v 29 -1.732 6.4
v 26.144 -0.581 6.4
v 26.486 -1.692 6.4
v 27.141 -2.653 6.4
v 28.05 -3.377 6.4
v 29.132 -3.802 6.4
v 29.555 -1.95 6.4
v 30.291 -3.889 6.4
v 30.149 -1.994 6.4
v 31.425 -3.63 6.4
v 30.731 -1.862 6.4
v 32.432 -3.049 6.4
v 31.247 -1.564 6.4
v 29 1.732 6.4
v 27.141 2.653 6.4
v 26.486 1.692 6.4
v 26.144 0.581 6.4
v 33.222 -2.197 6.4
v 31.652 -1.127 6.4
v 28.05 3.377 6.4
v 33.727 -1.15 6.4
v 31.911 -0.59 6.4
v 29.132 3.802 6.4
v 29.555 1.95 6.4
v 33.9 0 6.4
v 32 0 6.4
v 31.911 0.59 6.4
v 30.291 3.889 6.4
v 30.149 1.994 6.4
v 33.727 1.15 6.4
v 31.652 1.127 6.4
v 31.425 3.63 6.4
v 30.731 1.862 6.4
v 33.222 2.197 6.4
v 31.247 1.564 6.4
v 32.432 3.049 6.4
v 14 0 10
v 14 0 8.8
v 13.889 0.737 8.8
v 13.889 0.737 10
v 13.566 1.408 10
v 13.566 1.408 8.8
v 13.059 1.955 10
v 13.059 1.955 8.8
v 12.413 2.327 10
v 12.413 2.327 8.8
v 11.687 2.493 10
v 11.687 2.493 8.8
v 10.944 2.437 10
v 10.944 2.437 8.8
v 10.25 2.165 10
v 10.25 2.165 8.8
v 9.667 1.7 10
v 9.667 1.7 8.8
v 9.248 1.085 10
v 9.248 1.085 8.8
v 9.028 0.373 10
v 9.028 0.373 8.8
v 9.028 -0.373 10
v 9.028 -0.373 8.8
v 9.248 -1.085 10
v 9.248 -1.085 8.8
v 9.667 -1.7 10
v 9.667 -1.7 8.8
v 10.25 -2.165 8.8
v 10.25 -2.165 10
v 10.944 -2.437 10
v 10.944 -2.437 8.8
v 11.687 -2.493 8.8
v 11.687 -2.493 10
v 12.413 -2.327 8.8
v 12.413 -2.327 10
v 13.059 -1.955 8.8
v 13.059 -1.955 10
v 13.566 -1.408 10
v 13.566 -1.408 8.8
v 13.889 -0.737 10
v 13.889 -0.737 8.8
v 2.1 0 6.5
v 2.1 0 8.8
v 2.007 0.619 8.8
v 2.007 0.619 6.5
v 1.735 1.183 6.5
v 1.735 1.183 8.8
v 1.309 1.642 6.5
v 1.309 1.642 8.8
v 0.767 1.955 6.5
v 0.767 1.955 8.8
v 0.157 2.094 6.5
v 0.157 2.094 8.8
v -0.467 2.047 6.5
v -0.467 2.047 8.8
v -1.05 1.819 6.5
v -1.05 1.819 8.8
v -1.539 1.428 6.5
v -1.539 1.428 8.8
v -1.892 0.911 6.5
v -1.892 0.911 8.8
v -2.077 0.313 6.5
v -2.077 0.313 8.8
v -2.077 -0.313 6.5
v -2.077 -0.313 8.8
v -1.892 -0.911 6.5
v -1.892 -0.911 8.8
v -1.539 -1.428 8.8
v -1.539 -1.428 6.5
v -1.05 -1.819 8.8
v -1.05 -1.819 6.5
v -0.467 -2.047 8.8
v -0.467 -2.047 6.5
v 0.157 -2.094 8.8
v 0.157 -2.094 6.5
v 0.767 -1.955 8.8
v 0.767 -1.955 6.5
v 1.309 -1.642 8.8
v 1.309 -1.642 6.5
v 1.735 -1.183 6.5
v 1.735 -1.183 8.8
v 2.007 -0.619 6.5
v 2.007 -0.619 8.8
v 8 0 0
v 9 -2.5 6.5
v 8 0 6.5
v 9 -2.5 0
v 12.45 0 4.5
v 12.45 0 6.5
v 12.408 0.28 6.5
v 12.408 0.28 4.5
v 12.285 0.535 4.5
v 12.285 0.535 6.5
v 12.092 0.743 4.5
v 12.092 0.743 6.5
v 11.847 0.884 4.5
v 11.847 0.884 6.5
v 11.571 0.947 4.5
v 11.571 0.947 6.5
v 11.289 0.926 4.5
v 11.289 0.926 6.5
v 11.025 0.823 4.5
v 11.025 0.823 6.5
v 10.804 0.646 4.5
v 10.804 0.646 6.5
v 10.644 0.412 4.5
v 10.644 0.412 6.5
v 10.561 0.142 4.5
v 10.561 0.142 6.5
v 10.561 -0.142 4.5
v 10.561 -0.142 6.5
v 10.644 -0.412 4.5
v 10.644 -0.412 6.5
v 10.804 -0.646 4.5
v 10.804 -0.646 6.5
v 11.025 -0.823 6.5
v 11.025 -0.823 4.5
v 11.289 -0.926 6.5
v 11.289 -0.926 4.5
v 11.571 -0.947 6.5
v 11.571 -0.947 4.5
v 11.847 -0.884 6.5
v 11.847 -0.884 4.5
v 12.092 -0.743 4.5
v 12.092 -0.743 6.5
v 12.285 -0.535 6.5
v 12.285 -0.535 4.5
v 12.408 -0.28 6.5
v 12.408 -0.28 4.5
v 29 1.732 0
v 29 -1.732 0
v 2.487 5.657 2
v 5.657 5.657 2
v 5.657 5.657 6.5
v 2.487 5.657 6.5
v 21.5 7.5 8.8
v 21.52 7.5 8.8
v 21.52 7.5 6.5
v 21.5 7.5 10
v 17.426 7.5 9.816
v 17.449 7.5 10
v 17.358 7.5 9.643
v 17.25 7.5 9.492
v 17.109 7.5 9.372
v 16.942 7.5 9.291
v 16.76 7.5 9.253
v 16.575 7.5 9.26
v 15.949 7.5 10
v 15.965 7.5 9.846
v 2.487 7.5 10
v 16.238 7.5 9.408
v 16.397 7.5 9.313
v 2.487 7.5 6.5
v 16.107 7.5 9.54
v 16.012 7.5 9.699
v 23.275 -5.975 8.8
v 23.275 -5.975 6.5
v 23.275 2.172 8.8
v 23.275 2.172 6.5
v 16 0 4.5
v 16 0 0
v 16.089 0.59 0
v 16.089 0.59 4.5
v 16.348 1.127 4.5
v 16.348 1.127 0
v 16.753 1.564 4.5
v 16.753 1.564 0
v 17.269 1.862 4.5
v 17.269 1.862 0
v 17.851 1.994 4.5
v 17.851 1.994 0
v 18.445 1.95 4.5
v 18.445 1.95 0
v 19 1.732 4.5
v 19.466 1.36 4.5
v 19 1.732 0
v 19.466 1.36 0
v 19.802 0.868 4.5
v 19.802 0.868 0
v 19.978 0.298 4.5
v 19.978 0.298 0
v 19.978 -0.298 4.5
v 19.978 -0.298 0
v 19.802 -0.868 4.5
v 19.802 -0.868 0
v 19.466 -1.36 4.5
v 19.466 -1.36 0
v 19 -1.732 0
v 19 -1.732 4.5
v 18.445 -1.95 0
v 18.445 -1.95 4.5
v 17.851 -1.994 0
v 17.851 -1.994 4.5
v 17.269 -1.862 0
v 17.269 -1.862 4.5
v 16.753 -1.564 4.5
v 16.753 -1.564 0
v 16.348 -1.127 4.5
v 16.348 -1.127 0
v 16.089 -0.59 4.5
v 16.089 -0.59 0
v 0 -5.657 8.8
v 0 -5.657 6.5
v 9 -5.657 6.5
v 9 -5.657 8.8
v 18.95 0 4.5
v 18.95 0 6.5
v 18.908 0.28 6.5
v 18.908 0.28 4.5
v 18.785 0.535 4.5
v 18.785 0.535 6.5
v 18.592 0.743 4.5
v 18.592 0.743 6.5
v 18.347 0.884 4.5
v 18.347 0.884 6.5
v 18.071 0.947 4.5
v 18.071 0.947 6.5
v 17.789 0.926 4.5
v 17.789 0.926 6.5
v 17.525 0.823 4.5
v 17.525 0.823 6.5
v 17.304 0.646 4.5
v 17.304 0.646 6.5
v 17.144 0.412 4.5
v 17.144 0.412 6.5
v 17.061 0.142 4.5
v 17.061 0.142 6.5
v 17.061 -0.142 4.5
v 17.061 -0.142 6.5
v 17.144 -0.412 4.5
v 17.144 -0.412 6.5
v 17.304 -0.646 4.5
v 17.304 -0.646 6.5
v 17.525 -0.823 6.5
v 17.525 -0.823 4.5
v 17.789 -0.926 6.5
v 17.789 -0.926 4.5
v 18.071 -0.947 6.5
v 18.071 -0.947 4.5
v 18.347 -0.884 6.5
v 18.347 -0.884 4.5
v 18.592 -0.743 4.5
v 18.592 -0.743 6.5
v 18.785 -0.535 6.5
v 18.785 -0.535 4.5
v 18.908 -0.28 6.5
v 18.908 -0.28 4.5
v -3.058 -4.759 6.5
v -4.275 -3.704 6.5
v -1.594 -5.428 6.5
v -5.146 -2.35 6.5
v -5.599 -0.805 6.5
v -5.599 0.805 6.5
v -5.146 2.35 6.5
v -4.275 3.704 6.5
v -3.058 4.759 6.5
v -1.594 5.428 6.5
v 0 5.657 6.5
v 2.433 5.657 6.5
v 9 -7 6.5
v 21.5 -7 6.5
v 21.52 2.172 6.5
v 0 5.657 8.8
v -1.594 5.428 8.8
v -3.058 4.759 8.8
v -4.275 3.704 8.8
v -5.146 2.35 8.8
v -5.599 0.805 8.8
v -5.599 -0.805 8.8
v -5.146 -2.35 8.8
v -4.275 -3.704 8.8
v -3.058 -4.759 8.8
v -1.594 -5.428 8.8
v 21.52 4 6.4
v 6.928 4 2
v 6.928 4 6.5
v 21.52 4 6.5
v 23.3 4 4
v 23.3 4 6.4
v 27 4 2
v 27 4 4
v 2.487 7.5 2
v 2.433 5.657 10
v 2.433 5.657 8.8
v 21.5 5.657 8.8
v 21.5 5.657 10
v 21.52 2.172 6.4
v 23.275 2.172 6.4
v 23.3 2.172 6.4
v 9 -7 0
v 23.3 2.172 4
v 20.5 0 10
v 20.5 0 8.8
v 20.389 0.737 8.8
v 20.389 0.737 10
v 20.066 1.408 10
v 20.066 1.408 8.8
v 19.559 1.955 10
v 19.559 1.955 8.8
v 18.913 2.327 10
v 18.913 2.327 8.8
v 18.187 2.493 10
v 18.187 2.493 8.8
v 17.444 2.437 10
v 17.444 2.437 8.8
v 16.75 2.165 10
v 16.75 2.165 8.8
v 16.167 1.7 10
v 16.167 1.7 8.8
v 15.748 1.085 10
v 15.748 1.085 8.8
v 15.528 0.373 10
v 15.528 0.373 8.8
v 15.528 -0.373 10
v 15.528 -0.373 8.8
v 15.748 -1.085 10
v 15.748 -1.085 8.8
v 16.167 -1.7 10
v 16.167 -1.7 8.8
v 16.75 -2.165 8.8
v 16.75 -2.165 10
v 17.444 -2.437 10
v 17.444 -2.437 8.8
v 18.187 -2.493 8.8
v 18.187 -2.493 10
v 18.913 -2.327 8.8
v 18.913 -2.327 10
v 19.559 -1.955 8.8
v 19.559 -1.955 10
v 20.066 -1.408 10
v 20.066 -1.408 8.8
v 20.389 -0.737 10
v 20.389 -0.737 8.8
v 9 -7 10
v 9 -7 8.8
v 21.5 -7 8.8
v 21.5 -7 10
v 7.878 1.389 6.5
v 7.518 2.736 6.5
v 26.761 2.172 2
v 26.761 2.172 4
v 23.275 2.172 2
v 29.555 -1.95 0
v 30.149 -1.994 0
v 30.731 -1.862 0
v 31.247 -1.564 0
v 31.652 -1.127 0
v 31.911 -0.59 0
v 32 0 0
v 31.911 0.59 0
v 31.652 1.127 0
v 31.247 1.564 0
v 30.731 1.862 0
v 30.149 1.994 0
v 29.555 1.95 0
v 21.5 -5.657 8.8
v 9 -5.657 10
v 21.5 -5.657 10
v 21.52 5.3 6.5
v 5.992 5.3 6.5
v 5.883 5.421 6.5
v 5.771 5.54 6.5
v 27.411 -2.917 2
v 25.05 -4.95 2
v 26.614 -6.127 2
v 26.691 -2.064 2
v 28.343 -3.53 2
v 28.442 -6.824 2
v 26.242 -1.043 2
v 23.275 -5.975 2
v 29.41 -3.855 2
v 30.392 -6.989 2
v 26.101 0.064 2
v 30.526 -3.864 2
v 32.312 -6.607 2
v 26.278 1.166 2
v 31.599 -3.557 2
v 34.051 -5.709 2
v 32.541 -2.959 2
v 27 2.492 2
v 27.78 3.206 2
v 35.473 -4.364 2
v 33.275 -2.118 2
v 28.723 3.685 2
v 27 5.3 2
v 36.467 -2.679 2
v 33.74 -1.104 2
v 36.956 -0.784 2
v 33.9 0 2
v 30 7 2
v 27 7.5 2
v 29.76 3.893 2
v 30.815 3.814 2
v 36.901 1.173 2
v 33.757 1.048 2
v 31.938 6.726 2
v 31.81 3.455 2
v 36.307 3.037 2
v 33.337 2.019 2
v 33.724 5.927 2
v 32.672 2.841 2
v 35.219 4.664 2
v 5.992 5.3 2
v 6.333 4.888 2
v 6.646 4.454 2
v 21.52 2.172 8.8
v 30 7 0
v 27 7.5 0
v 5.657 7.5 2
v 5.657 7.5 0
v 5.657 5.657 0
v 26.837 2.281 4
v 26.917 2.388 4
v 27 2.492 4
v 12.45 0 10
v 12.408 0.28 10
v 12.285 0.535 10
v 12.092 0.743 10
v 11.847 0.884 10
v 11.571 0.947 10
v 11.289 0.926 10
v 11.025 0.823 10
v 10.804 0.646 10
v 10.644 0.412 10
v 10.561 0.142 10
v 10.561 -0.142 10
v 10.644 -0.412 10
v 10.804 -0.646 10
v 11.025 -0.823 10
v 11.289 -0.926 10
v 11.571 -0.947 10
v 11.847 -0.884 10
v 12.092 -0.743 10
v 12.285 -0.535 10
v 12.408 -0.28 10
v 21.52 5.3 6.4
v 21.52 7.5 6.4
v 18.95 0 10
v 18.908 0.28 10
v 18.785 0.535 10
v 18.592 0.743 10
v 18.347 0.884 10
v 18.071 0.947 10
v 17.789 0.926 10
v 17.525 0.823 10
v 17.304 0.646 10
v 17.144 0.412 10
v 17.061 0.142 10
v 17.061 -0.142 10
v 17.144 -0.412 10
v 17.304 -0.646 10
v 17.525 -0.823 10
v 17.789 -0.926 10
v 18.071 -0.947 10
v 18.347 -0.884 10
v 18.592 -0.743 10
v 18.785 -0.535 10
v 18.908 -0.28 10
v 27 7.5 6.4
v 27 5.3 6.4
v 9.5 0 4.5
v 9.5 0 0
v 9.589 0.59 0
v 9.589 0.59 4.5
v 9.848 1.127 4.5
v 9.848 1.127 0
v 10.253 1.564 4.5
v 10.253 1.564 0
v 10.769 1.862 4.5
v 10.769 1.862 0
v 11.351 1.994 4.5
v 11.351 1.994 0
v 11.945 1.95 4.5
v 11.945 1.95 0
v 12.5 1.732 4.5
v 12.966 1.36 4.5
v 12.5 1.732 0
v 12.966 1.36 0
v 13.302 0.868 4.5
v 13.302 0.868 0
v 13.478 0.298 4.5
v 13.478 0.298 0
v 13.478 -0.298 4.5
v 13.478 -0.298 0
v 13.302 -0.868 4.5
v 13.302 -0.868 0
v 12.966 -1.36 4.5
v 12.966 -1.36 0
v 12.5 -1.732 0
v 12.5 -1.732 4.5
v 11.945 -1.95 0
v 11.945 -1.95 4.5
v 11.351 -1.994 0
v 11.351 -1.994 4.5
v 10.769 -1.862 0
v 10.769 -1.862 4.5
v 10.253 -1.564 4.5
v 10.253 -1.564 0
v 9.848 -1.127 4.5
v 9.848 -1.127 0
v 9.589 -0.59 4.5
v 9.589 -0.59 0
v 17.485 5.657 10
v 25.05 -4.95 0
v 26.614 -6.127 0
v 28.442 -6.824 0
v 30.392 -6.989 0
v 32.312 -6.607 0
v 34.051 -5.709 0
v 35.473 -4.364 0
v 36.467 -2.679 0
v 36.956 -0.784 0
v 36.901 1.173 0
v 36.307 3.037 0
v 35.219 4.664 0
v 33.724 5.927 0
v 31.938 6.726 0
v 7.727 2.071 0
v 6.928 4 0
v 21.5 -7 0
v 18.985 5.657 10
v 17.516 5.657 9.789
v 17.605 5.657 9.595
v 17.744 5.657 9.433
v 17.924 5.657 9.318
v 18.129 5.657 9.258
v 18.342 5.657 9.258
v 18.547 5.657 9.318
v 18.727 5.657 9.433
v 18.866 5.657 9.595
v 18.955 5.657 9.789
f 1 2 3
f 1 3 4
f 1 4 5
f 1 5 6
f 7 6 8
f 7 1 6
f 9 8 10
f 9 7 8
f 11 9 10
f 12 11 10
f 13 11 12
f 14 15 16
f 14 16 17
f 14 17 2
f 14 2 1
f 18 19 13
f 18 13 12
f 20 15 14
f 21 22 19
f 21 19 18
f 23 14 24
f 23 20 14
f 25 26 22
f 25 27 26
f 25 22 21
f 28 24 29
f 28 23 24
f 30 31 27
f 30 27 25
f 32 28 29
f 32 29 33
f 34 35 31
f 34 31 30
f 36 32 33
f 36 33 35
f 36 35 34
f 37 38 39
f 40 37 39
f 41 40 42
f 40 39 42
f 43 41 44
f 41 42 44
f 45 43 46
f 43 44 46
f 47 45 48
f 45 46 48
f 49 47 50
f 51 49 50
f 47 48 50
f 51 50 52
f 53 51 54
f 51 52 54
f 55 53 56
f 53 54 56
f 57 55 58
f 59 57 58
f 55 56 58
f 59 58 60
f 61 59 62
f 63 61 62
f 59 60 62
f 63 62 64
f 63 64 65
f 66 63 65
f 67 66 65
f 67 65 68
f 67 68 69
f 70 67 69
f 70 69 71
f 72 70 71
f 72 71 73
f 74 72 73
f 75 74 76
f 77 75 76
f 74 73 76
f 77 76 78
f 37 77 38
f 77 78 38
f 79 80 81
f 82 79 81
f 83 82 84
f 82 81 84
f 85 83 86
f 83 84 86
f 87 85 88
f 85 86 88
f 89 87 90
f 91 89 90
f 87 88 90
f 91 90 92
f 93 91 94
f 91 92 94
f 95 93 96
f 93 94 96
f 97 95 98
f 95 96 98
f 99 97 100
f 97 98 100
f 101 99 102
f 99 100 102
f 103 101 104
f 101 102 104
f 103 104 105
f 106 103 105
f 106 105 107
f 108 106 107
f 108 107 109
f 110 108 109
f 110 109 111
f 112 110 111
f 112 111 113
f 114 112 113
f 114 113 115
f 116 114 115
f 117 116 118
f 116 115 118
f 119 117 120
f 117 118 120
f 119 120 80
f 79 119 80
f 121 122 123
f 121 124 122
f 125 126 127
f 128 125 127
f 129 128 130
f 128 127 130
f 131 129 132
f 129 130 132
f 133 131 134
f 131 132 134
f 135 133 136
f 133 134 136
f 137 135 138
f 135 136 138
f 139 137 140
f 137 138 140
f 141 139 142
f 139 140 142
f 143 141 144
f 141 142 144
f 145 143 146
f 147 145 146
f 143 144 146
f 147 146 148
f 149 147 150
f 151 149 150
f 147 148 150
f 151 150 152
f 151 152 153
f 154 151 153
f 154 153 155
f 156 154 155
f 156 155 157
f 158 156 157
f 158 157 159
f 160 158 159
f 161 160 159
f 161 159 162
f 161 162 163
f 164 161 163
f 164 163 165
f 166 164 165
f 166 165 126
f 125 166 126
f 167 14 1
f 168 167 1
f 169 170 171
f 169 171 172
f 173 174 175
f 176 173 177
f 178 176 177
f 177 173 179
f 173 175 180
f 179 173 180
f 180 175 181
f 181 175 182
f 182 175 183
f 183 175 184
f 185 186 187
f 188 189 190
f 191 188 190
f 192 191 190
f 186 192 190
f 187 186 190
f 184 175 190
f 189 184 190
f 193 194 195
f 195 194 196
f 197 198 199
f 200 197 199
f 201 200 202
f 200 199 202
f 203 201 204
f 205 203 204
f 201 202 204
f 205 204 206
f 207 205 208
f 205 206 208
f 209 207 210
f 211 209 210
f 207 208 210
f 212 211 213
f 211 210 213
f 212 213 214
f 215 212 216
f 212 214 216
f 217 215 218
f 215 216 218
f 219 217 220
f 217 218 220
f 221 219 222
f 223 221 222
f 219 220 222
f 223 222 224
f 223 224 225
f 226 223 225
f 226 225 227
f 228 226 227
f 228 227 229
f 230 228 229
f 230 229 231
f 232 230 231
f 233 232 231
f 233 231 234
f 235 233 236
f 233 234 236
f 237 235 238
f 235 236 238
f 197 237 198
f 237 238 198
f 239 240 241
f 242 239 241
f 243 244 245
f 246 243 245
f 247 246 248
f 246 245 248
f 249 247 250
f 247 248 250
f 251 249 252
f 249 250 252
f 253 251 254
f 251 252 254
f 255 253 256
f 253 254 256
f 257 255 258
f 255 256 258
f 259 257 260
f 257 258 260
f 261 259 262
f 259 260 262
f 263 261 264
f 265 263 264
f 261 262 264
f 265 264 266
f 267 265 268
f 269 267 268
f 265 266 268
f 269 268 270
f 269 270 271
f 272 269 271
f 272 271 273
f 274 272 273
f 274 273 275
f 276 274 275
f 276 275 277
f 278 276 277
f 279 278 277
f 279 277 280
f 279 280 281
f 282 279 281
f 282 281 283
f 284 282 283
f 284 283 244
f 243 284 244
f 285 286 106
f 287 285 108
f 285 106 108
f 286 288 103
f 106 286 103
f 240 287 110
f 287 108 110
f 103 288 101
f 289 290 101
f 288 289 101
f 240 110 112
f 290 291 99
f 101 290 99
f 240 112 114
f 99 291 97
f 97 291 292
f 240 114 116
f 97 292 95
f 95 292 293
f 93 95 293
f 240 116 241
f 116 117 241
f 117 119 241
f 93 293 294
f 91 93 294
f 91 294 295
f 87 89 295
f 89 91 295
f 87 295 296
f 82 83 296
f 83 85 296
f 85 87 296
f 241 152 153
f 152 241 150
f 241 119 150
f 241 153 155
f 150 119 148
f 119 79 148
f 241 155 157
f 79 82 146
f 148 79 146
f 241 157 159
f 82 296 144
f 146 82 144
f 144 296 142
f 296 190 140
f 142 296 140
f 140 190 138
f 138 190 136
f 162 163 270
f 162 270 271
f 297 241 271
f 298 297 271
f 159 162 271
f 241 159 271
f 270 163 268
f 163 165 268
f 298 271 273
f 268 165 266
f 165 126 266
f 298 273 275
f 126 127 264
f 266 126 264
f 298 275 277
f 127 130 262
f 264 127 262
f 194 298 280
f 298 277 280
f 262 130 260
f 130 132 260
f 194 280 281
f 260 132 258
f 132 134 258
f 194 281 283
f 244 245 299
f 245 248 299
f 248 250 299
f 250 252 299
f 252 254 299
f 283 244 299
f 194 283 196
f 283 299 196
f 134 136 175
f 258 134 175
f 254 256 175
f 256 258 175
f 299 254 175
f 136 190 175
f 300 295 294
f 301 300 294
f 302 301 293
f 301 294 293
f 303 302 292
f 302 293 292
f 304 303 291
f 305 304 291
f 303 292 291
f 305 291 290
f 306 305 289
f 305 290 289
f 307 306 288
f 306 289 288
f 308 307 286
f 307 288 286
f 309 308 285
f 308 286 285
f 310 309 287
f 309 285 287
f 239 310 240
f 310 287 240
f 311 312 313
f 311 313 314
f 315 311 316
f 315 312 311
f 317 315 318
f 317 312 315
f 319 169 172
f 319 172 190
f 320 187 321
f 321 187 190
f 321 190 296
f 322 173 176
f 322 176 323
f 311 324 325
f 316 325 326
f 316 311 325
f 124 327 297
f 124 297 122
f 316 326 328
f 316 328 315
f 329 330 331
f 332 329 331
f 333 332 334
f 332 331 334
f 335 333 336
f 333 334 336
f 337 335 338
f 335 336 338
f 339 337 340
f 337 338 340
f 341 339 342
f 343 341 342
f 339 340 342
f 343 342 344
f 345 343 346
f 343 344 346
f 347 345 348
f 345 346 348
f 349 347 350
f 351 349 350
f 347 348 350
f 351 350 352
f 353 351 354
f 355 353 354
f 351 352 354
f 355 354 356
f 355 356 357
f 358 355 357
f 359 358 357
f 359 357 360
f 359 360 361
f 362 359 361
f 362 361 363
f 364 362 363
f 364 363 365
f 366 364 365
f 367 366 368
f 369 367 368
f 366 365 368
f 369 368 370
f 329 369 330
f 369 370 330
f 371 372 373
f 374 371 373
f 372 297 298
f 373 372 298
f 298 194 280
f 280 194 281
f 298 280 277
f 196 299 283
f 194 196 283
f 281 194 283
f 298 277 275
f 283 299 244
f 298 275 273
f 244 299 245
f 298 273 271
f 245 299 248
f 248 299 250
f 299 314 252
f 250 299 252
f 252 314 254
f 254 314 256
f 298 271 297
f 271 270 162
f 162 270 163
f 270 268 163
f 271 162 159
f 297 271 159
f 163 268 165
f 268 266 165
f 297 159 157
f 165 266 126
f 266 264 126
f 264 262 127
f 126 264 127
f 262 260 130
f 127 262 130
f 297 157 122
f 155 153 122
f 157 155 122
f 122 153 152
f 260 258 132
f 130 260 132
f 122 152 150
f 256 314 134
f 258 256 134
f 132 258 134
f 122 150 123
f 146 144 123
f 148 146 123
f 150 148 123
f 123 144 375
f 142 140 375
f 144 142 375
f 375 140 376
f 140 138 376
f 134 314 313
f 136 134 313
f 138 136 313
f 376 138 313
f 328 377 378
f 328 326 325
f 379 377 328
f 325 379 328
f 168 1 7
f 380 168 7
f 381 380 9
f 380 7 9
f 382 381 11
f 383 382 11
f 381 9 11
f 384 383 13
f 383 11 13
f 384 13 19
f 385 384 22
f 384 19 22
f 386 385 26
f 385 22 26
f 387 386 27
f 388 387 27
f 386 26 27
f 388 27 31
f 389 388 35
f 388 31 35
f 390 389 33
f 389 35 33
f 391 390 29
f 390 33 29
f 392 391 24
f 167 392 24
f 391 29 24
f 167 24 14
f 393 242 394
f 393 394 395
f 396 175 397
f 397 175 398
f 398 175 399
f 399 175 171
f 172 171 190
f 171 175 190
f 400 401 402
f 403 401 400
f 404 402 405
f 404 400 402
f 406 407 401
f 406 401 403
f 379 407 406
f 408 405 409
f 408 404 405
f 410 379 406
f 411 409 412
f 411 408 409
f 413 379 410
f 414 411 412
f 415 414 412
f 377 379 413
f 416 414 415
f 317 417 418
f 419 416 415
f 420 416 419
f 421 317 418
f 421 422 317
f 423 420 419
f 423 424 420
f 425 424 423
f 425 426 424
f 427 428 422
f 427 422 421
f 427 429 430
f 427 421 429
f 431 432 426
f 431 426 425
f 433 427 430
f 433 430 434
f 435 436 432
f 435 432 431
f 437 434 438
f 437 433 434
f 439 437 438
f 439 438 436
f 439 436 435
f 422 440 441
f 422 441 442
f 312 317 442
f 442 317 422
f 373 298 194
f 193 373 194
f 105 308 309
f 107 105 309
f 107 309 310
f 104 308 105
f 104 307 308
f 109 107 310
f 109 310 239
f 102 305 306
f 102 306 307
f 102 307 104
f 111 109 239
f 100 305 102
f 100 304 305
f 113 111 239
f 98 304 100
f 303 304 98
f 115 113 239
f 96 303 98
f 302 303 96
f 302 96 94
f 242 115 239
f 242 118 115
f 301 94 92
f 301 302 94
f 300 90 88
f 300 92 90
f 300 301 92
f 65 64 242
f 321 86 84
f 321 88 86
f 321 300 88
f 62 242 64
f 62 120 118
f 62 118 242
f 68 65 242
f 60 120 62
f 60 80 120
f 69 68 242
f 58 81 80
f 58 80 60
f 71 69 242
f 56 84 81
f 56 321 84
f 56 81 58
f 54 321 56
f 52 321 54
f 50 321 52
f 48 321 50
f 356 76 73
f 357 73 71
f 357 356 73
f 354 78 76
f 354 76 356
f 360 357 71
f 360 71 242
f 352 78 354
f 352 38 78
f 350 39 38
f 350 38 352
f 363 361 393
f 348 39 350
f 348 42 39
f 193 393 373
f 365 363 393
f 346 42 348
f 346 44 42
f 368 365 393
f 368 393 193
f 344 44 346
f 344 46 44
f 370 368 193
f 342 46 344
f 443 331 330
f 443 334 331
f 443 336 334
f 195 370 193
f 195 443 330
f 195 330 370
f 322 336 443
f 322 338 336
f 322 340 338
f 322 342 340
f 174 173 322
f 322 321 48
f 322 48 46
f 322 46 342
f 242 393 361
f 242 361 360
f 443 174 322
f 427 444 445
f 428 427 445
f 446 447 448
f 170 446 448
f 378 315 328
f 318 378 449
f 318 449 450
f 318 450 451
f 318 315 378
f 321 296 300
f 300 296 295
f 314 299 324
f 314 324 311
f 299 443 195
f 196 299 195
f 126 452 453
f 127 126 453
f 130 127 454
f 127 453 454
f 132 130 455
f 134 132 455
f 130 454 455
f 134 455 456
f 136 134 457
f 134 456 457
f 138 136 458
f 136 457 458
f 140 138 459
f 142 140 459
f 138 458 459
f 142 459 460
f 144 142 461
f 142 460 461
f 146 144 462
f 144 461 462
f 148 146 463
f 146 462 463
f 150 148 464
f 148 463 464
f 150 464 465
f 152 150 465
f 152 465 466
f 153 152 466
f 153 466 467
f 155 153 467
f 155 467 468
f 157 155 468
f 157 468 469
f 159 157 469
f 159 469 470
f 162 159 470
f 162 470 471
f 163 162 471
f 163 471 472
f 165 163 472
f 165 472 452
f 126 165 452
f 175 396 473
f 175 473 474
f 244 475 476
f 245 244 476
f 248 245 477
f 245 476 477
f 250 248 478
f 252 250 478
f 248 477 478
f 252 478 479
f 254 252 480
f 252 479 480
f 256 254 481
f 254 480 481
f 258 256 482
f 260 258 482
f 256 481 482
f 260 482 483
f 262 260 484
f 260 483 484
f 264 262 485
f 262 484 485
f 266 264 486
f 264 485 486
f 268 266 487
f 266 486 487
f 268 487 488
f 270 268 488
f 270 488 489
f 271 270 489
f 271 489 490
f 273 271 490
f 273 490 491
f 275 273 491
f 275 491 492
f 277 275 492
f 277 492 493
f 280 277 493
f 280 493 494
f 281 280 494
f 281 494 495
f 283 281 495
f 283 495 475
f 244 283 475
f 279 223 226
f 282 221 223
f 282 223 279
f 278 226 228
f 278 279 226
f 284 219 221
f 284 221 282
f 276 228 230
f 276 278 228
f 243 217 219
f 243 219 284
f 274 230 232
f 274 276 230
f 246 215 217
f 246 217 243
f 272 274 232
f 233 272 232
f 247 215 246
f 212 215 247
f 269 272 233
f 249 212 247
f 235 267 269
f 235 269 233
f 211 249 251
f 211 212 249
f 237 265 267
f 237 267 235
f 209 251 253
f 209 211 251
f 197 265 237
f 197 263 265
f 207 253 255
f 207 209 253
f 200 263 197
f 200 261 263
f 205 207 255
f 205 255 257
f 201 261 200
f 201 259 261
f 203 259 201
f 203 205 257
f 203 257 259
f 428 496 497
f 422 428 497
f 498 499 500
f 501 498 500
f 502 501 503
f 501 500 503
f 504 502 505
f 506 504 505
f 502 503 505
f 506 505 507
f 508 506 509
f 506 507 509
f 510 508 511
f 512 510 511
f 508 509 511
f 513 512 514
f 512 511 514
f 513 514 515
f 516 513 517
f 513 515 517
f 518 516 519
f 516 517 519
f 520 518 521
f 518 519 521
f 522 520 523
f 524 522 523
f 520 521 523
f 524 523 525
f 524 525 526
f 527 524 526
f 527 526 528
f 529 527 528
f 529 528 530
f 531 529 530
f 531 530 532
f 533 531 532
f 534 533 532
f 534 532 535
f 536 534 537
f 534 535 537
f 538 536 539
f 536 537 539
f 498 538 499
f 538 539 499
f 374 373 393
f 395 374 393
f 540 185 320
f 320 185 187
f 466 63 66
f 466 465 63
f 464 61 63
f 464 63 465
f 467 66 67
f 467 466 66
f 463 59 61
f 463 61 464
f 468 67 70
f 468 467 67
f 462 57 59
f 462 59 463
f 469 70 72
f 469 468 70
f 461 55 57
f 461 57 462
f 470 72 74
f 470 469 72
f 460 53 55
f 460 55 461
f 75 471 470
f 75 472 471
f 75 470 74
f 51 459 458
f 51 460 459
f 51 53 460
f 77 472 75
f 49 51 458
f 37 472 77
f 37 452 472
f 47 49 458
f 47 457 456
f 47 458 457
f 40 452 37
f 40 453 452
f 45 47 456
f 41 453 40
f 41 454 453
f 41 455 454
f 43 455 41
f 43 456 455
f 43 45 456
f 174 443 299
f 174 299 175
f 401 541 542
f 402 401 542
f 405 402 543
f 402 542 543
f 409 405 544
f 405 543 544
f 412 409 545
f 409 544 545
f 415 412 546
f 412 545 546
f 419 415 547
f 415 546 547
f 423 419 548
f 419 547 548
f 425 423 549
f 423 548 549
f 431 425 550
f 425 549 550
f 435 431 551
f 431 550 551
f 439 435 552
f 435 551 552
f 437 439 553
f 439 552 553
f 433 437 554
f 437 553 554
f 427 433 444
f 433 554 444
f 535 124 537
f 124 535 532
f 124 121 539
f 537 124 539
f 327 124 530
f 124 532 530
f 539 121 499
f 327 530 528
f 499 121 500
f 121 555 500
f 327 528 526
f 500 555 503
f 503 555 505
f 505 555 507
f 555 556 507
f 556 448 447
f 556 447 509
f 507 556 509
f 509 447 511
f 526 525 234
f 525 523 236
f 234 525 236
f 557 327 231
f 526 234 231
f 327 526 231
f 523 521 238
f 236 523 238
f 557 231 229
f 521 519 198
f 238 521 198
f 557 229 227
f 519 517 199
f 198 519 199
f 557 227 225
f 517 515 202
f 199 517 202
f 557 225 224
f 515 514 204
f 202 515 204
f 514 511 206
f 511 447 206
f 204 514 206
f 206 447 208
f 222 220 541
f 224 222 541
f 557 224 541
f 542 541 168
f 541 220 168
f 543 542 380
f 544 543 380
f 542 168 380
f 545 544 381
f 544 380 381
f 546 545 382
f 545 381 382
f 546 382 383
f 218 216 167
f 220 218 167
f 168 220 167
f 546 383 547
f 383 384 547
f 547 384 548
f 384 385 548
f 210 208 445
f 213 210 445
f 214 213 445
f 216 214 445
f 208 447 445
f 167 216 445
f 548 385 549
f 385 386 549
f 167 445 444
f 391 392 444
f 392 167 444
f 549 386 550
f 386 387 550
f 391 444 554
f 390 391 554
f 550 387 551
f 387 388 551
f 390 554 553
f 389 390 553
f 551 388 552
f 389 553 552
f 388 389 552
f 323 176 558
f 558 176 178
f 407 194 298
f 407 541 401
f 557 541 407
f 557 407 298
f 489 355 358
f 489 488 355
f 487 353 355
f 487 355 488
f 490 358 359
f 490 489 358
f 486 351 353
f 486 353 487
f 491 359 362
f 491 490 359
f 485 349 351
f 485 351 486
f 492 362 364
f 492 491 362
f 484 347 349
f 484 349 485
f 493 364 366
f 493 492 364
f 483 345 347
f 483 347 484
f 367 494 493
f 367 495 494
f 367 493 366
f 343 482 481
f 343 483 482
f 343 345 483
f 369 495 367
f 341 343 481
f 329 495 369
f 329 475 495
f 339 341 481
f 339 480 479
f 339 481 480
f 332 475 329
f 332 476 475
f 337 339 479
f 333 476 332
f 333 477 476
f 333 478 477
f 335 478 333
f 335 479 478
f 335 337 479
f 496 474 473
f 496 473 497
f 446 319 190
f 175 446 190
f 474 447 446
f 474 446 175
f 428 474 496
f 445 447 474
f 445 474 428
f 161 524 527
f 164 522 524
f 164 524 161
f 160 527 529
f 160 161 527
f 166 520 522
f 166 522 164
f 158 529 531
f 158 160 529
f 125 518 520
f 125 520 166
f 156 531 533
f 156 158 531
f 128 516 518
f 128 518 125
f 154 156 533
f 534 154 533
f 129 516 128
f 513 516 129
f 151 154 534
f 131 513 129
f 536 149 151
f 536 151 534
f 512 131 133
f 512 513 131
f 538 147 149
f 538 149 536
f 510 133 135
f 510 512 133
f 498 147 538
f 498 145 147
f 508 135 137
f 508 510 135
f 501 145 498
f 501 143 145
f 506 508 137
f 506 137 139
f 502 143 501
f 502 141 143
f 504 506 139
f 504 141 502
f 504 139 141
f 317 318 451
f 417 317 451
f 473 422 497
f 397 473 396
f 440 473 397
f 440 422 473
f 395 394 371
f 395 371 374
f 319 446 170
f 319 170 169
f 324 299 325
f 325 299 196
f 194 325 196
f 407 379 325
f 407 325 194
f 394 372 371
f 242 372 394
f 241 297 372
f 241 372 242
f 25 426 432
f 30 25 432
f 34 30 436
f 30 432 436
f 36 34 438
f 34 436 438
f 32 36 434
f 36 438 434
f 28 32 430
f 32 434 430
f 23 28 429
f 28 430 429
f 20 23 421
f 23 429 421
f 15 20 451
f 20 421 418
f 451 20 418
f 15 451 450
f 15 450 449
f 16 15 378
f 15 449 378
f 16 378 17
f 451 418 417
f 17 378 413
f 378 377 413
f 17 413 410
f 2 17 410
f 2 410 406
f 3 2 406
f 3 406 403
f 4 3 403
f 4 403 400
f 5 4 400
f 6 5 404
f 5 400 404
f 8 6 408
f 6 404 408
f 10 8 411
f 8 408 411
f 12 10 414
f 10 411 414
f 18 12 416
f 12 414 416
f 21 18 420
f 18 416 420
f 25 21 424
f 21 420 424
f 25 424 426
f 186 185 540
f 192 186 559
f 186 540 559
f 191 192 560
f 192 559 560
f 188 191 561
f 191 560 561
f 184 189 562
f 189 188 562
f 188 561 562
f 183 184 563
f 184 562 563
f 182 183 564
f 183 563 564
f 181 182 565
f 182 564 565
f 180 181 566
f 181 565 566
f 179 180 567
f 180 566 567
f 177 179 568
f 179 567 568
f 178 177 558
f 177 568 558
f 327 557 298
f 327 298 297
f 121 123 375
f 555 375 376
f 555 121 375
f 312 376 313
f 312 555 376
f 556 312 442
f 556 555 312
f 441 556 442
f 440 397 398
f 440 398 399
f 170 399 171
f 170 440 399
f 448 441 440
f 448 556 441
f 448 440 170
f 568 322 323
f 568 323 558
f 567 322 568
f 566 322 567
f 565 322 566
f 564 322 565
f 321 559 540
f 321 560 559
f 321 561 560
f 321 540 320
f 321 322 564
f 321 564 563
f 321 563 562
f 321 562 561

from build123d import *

# Parameters (mm, degrees)
BOSS_EXTRUDE1_DEPTH  = 2
BOSS_EXTRUDE6_DEPTH  = 4.5
CUT_EXTRUDE6_DEPTH   = 4.5
BOSS_EXTRUDE14_DEPTH = 2.3
SKETCH32_R           = 2.1
CUT_EXTRUDE7_DEPTH   = 2.3
SKETCH33_W           = 12.5
SKETCH33_H           = 1.343145751
BOSS_EXTRUDE15_DEPTH = 1.2
SKETCH35_W           = 5.479645997
SKETCH35_H           = 5.327993755
CUT_EXTRUDE8_DEPTH   = 2.4
SKETCH36_W           = 3.7
SKETCH36_H           = 1.827993755
CUT_EXTRUDE9_DEPTH   = 2.4
SKETCH37_R           = 3.9
BOSS_EXTRUDE16_DEPTH = 4.4
CUT_EXTRUDE10_DEPTH  = 7.4
SKETCH43_R           = 2.5
BOSS_EXTRUDE17_DEPTH = 1.2
SKETCH44_R           = 0.95
CUT_EXTRUDE11_DEPTH  = 11
SKETCH45_R           = 2
CUT_EXTRUDE12_DEPTH  = 4.5
SKETCH52_R           = 0.75
CUT_EXTRUDE13_DEPTH  = 10


with BuildPart() as part:
    # Sketch3 → Boss-Extrude1 (new body)
    with BuildSketch(Plane.XY):
        with BuildLine():
            Line((8, 0), (9, -2.5))
            Line((9, -2.5), (9, -7))
            Line((9, -7), (21.5, -7))
            Line((21.5, -7), (25.050252532, -4.949747468))
            ThreePointArc((25.050252532, -4.949747468), (36.467156728, -2.678784027), (30, 7))
            Line((30, 7), (27, 7.5))
            Line((27, 7.5), (5.656854249, 7.5))
            Line((5.656854249, 7.5), (5.656854249, 5.656854249))
            ThreePointArc((5.656854249, 5.656854249), (7.39103626, 3.061467459), (8, 0))
        make_face()
    extrude(amount=BOSS_EXTRUDE1_DEPTH)

    # Sketch22 → Boss-Extrude6 (add)
    with BuildSketch(Plane.XY.offset(2)):
        with BuildLine():
            Line((5.656854249, 5.656854249), (2.486790148, 5.656854249))
            Line((2.486790148, 5.656854249), (2.486790148, 7.5))
            Line((2.486790148, 7.5), (5.656854249, 7.5))
            Line((5.656854249, 7.5), (21.5, 7.5))
            Line((21.5, 7.5), (27, 7.5))
            Line((27, 7.5), (27, 2.172006245))
            Line((27, 2.172006245), (23.275126266, 2.172006245))
            Line((23.275126266, 2.172006245), (23.275126266, -5.974873734))
            Line((23.275126266, -5.974873734), (21.5, -7))
            Line((21.5, -7), (9, -7))
            Line((9, -7), (9, -2.5))
            Line((9, -2.5), (8, 0))
            ThreePointArc((8, 0), (7.39103626, 3.061467459), (5.656854249, 5.656854249))
        make_face()
    extrude(amount=BOSS_EXTRUDE6_DEPTH)

    # Sketch26 → Cut-Extrude6 (cut)
    with BuildSketch(Plane.XY.offset(2)):
        Polygon((18.098080448, 5.3), (2.530052458, 5.3), (2.530052458, 4), (18.098080448, 4), (27, 4), (27, 5.3), align=None)
    extrude(amount=CUT_EXTRUDE6_DEPTH, mode=Mode.SUBTRACT)


with BuildPart() as body_2:
    # Sketch31 → Boss-Extrude14 (new body)
    with BuildSketch(Plane.XY.offset(6.5)):
        with BuildLine():
            Line((2.432688066, 5.656854249), (0, 5.656854249))
            ThreePointArc((0, 5.656854249), (-5.656854249, 0), (0, -5.656854249))
            Line((0, -5.656854249), (9, -5.656854249))
            Line((9, -5.656854249), (9, -7))
            Line((9, -7), (21.5, -7))
            Line((21.5, -7), (23.275126266, -5.974873734))
            Line((23.275126266, -5.974873734), (23.275126266, 2.172006245))
            Line((23.275126266, 2.172006245), (27, 2.172006245))
            Line((27, 2.172006245), (27, 7.5))
            Line((27, 7.5), (2.486790148, 7.5))
            Line((2.486790148, 7.5), (2.432688066, 5.656854249))
        make_face()
    extrude(amount=BOSS_EXTRUDE14_DEPTH)

    # Sketch32 → Cut-Extrude7 (cut)
    with BuildSketch(Plane.XY.offset(8.8)):
        Circle(SKETCH32_R)
    extrude(amount=-CUT_EXTRUDE7_DEPTH, mode=Mode.SUBTRACT)

    # Sketch33 → Boss-Extrude15 (add)
    with BuildSketch(Plane.XY.offset(8.8)):
        with Locations((15.25, -6.328427125)):
            Rectangle(SKETCH33_W, SKETCH33_H)
        Polygon((2.486790148, 7.5), (21.5, 7.5), (21.5, 5.656854249), (2.432688066, 5.656854249), align=None)
    extrude(amount=BOSS_EXTRUDE15_DEPTH)


with BuildPart() as cut_extrude8_tool:
    # Sketch35 → Cut-Extrude8 (new body)
    with BuildSketch(Plane.XY.offset(8.8)):
        with Locations((24.260177002, 4.836003123)):
            Rectangle(SKETCH35_W, SKETCH35_H)
    extrude(amount=-CUT_EXTRUDE8_DEPTH)


with BuildPart() as part_1:
    add(part.part)

    # Cut-Extrude8: cut by cut_extrude8_tool
    add(cut_extrude8_tool.part, mode=Mode.SUBTRACT)

    # Sketch36 → Cut-Extrude9 (cut)
    with BuildSketch(Plane.XY.offset(6.4)):
        with Locations((25.15, 3.086003123)):
            Rectangle(SKETCH36_W, SKETCH36_H)
    extrude(amount=-CUT_EXTRUDE9_DEPTH, mode=Mode.SUBTRACT)

    # Sketch37 → Boss-Extrude16 (add)
    with BuildSketch(Plane.XY.offset(2)):
        with Locations((30, 0)):
            Circle(SKETCH37_R)
    extrude(amount=BOSS_EXTRUDE16_DEPTH)

    # Sketch39 → Cut-Extrude10 (cut, through all)
    with BuildSketch(Plane.XY.offset(6.4)):
        with BuildLine():
            Line((29, 1.732050808), (29, -1.732050808))
            ThreePointArc((29, -1.732050808), (32, 0), (29, 1.732050808))
        make_face()
    extrude(amount=-CUT_EXTRUDE10_DEPTH, mode=Mode.SUBTRACT)


with BuildPart() as body_2_1:
    add(body_2.part)

    # Cut-Extrude8: cut by cut_extrude8_tool
    add(cut_extrude8_tool.part, mode=Mode.SUBTRACT)

    # Sketch43 → Boss-Extrude17 (add)
    with BuildSketch(Plane.XY.offset(8.8)):
        with Locations((11.5, 0)):
            Circle(SKETCH43_R)
        with Locations((18, 0)):
            Circle(SKETCH43_R)
    extrude(amount=BOSS_EXTRUDE17_DEPTH)


with BuildPart() as cut_extrude11_tool:
    # Sketch44 → Cut-Extrude11 (new body, through all)
    with BuildSketch(Plane.XY.offset(10)):
        with Locations((11.5, 0)):
            Circle(SKETCH44_R)
        with Locations((18, 0)):
            Circle(SKETCH44_R)
    extrude(amount=-CUT_EXTRUDE11_DEPTH)


with BuildPart() as part_2:
    add(part_1.part)

    # Cut-Extrude11: cut by cut_extrude11_tool
    add(cut_extrude11_tool.part, mode=Mode.SUBTRACT)

    # Sketch45 → Cut-Extrude12 (cut)
    with BuildSketch(Plane(origin=(0, 0, 0), x_dir=(-1, 0, 0), z_dir=(0, 0, -1))):
        with Locations((-11.5, 0)):
            Circle(SKETCH45_R)
        with Locations((-18, 0)):
            Circle(SKETCH45_R)
    extrude(amount=-CUT_EXTRUDE12_DEPTH, mode=Mode.SUBTRACT)


with BuildPart() as body_2_2:
    add(body_2_1.part)

    # Cut-Extrude11: cut by cut_extrude11_tool
    add(cut_extrude11_tool.part, mode=Mode.SUBTRACT)

    # Sketch52 → Cut-Extrude13 (cut, along a direction that is not the sketch's normal)
    with BuildSketch(Plane.XZ.offset(-5.656854249)):
        with Locations((18.235476819, 10)):
            Circle(SKETCH52_R)
    extrude(amount=-CUT_EXTRUDE13_DEPTH, dir=(0.640410196, -0.76803306, 0), mode=Mode.SUBTRACT)


solid = Compound([part_2.part, body_2_2.part])
